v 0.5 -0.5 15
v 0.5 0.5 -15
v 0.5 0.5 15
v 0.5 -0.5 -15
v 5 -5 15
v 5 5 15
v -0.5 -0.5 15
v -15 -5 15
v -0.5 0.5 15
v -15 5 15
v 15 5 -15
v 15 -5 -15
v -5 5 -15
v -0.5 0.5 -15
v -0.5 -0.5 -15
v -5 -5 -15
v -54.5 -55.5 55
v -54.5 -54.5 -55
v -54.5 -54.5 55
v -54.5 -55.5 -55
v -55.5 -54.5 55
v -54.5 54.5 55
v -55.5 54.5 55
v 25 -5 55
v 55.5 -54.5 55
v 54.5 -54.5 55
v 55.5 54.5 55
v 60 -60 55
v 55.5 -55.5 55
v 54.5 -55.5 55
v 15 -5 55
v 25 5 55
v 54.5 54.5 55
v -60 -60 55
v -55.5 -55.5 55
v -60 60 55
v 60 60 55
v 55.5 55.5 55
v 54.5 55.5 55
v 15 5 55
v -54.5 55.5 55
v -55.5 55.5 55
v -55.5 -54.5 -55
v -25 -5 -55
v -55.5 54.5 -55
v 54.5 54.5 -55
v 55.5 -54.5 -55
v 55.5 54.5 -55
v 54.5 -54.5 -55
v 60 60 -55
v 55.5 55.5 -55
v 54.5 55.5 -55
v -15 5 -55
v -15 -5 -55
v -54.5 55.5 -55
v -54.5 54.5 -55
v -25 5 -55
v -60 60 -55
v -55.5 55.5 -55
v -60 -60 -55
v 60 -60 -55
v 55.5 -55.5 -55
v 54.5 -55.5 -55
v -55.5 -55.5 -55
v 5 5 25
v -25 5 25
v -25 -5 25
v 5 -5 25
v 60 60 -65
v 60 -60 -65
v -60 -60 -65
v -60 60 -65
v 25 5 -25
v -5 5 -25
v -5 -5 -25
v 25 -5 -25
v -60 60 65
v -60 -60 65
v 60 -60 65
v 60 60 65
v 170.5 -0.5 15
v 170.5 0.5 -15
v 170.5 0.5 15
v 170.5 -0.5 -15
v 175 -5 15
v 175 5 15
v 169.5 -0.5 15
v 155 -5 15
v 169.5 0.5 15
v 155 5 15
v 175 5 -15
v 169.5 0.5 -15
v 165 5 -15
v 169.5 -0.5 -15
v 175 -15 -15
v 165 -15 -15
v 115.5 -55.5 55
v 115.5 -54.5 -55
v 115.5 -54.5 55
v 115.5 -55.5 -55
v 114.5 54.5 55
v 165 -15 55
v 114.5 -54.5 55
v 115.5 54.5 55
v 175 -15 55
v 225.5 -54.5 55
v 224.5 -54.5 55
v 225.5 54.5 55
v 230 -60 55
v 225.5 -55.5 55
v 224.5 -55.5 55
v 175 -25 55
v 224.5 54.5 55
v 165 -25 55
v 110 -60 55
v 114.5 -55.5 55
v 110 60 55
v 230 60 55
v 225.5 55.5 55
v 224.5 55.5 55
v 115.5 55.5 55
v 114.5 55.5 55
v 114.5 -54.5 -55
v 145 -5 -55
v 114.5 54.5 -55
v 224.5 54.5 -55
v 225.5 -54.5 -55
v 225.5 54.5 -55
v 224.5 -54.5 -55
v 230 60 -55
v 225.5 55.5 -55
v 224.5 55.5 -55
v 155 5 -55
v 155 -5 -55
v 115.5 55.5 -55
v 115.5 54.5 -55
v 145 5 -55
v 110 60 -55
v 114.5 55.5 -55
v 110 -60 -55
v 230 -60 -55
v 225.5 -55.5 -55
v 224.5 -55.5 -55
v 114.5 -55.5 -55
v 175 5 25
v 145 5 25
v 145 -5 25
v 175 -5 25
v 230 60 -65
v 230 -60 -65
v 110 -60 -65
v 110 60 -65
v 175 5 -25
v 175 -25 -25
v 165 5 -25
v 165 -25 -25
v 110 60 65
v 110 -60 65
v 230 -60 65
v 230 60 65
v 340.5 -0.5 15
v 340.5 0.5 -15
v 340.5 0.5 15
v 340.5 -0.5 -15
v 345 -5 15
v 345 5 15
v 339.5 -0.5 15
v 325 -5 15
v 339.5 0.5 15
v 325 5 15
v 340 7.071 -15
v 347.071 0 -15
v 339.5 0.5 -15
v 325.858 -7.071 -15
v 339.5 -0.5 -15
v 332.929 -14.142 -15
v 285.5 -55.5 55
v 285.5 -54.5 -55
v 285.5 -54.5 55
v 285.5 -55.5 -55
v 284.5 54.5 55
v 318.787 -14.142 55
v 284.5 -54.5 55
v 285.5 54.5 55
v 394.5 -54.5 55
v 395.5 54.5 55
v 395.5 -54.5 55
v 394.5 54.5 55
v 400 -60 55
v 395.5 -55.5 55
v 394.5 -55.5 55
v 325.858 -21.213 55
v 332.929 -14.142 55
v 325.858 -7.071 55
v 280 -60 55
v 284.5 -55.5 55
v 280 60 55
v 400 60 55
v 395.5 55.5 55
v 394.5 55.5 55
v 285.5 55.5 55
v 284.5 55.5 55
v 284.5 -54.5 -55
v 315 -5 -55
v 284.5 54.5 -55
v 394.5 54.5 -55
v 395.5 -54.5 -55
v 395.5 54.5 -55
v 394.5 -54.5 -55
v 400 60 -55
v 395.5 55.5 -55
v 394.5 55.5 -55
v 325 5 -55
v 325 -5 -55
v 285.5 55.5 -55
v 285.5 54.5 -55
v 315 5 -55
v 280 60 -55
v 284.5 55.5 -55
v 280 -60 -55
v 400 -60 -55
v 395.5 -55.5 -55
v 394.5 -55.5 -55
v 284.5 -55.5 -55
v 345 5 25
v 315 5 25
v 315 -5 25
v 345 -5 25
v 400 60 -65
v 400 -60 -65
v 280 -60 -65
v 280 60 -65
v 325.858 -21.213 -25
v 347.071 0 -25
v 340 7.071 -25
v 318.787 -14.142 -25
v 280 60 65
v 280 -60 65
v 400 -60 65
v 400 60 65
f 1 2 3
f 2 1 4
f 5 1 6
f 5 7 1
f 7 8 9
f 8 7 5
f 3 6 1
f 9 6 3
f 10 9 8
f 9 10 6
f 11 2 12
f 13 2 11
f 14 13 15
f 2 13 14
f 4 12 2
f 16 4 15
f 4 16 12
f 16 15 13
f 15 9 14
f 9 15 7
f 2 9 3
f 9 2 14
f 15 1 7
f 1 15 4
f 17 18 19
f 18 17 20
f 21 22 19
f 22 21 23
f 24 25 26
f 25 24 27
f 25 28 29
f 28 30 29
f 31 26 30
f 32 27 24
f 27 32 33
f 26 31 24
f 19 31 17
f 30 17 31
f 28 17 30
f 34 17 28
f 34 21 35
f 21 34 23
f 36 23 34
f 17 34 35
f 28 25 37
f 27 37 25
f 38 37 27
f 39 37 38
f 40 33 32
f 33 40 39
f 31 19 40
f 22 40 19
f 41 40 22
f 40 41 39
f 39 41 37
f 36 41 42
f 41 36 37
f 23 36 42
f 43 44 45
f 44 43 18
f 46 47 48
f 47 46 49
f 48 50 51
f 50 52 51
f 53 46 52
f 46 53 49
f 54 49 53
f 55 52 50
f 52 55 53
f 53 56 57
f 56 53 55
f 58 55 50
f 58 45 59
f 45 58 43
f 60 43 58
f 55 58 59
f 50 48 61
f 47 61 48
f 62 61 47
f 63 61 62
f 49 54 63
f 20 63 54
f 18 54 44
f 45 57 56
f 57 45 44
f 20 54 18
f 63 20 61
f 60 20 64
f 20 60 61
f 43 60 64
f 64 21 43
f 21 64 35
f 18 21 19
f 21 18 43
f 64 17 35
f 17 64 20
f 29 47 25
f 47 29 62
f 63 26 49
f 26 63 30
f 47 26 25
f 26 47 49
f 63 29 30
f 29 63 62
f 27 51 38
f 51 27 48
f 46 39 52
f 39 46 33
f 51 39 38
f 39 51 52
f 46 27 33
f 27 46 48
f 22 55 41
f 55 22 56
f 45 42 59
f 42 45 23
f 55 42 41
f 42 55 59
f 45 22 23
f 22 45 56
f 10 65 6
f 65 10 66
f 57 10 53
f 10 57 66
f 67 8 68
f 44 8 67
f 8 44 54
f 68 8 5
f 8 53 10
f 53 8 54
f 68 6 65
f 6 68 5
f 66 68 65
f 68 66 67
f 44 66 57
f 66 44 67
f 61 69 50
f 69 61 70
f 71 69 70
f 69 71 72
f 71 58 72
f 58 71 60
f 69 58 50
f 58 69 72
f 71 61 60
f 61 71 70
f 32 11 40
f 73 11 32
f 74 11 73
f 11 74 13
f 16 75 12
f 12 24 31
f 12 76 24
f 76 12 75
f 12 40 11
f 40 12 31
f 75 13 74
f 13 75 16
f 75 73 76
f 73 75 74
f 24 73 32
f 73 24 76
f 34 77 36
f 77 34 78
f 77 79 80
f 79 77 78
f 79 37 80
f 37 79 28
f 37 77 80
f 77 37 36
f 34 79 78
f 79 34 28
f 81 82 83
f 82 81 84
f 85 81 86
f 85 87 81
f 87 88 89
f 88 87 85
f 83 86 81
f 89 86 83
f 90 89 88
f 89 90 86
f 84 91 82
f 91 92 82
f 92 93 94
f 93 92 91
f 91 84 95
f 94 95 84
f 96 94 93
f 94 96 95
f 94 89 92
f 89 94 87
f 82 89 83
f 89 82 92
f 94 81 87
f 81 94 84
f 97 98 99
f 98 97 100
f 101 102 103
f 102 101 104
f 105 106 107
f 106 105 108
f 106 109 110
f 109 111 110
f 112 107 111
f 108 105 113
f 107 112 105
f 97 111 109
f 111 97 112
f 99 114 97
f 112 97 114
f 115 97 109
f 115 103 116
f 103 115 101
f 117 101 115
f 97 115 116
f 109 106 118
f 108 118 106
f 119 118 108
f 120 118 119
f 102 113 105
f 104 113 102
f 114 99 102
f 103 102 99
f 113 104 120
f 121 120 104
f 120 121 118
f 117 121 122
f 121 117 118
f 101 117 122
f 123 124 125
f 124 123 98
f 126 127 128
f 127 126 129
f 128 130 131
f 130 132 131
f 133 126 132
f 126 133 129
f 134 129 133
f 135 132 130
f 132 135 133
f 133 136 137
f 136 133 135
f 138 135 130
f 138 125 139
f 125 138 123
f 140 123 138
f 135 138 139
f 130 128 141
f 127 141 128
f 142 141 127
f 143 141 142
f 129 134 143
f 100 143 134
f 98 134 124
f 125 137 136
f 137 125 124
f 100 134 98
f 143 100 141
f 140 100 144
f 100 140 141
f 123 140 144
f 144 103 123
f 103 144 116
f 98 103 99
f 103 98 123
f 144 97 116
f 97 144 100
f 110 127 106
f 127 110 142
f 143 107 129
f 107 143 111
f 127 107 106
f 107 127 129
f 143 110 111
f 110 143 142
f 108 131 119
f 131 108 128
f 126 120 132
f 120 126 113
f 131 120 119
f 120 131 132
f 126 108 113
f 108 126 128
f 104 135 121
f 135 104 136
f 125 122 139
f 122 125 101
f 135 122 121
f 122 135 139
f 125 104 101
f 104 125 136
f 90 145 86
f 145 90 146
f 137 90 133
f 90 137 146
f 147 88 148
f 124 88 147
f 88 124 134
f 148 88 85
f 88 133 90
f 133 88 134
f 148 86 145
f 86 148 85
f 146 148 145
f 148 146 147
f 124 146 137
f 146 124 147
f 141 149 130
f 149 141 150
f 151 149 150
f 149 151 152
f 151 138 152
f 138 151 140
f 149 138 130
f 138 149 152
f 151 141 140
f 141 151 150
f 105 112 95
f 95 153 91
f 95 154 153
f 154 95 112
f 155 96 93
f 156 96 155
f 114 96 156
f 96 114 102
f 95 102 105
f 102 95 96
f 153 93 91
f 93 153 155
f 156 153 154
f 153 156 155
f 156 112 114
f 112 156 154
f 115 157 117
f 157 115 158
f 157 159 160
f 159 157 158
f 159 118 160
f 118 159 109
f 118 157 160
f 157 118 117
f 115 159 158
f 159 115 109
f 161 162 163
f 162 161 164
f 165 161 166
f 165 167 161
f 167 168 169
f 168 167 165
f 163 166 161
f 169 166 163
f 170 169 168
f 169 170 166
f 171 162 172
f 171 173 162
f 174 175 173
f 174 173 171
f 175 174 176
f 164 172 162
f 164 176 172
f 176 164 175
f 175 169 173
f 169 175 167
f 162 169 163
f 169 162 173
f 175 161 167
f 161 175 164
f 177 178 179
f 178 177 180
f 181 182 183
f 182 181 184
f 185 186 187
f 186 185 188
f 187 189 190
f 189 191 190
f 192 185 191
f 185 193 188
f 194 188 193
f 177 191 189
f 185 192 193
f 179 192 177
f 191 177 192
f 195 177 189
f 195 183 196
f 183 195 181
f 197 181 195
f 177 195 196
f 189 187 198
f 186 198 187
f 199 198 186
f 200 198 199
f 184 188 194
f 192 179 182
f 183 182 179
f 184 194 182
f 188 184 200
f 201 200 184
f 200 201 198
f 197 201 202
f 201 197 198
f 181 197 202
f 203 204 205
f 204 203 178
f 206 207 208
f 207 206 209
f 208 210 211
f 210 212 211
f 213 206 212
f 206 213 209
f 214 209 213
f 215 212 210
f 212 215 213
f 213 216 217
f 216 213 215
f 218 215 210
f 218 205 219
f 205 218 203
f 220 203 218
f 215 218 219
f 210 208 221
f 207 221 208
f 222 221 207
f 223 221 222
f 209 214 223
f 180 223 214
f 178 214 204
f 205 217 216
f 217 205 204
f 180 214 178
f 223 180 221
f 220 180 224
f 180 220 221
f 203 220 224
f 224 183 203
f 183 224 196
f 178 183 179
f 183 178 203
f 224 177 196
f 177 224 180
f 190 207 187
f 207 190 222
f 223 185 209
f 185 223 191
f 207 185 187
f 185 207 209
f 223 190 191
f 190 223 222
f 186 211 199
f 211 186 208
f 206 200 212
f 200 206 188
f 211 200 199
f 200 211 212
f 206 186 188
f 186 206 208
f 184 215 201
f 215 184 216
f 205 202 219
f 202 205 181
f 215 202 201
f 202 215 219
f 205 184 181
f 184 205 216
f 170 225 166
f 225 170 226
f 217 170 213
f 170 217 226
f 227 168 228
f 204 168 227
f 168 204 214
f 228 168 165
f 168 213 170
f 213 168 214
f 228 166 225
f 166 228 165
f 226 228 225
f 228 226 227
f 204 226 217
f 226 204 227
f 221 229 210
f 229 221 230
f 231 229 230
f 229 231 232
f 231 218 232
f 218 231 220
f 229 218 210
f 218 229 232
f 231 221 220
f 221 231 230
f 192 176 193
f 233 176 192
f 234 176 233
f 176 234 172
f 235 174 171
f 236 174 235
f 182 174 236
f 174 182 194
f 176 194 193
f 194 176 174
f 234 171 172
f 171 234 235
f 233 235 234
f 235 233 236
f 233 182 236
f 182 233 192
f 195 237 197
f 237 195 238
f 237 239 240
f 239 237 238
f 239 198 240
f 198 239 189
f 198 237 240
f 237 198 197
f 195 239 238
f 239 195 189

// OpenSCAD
// tensegrity_table
//
// This is a square design

table_base_dim = 120;

// the center rope that supports top of the table via bottom of table
rope_length = 30;

// these lengths are the for centers of the pieces, not
// the total length!
// note that the lengths overlap, so to speak!
horiz_part_len = 20;
vert_part_len = 70;


// x_section_dim
xsd = 10;
xsd2 = xsd / 2;

// draw rope
debug = true;
//debug = false;
rope_thickness = 1;

// clearance between the bottom and top table surfaces
table_vert_gap = 2*vert_part_len - rope_length;

// 0 is typical design (symmetry)
// 90 for right angle
// 135 for almost touching and coming from similar angle
top_L_rot = 135;

offset = table_base_dim + 50;

L_rots = [0, 90, 135];

for (index = [0 : len(L_rots)-1]) {
    translate([offset * index, 0, 0])
        main(L_rots[index]);
}

module main(top_L_rot = 0) {
    // table bottom
    half_part(draw_ropes = true);

    // table top
    scale([-1, 1, -1])
        half_part(top_L_rot = top_L_rot);
}

module rope(length) {
    color("cyan")
        cube([rope_thickness, rope_thickness, length], center = true);
}

// Both L shapes in the center.
module half_part(top_L_rot = 0, draw_ropes = false) {
    if (debug && draw_ropes) {
        rope(rope_length);

        // two ropes for one side of the base
        translate([-(table_base_dim-xsd)/2, -(table_base_dim-xsd)/2, 0])
            rope(table_vert_gap);
        
        translate([(table_base_dim-xsd)/2, -(table_base_dim-xsd)/2, 0])
            rope(table_vert_gap);
        
        translate([(table_base_dim-xsd)/2, (table_base_dim-xsd)/2, 0])
            rope(table_vert_gap);
        
        translate([-(table_base_dim-xsd)/2, (table_base_dim-xsd)/2, 0])
            rope(table_vert_gap);        
    }    

    // centre L
    rotate([90, 0, top_L_rot]) {
        linear_extrude(xsd, center = true) {
            // connected to table bottom
            half_center();

//            // connected to table top
//            rotate([0, 0, 180])
//                half_center();
        }
    }
    // the base
    translate([0, 0, rope_length / 2 - xsd2 - vert_part_len])
        cube([table_base_dim, table_base_dim, xsd], center = true);            
}

// One of the two L shapes in the center.
//
// this part is renderd relative to middle of the support rope
module half_center() {
    // horiz bar
    translate([-horiz_part_len / 2, rope_length / 2 + xsd2, 0])
        square([horiz_part_len + xsd, xsd], center = true);

    // vert bar
    translate([-horiz_part_len, rope_length / 2 + xsd2 - vert_part_len / 2, 0])
        square([xsd, vert_part_len + xsd], center = true);

    // (table surface/base has to be done outside here because
    // it's not part of the extruded center piece)    
}
